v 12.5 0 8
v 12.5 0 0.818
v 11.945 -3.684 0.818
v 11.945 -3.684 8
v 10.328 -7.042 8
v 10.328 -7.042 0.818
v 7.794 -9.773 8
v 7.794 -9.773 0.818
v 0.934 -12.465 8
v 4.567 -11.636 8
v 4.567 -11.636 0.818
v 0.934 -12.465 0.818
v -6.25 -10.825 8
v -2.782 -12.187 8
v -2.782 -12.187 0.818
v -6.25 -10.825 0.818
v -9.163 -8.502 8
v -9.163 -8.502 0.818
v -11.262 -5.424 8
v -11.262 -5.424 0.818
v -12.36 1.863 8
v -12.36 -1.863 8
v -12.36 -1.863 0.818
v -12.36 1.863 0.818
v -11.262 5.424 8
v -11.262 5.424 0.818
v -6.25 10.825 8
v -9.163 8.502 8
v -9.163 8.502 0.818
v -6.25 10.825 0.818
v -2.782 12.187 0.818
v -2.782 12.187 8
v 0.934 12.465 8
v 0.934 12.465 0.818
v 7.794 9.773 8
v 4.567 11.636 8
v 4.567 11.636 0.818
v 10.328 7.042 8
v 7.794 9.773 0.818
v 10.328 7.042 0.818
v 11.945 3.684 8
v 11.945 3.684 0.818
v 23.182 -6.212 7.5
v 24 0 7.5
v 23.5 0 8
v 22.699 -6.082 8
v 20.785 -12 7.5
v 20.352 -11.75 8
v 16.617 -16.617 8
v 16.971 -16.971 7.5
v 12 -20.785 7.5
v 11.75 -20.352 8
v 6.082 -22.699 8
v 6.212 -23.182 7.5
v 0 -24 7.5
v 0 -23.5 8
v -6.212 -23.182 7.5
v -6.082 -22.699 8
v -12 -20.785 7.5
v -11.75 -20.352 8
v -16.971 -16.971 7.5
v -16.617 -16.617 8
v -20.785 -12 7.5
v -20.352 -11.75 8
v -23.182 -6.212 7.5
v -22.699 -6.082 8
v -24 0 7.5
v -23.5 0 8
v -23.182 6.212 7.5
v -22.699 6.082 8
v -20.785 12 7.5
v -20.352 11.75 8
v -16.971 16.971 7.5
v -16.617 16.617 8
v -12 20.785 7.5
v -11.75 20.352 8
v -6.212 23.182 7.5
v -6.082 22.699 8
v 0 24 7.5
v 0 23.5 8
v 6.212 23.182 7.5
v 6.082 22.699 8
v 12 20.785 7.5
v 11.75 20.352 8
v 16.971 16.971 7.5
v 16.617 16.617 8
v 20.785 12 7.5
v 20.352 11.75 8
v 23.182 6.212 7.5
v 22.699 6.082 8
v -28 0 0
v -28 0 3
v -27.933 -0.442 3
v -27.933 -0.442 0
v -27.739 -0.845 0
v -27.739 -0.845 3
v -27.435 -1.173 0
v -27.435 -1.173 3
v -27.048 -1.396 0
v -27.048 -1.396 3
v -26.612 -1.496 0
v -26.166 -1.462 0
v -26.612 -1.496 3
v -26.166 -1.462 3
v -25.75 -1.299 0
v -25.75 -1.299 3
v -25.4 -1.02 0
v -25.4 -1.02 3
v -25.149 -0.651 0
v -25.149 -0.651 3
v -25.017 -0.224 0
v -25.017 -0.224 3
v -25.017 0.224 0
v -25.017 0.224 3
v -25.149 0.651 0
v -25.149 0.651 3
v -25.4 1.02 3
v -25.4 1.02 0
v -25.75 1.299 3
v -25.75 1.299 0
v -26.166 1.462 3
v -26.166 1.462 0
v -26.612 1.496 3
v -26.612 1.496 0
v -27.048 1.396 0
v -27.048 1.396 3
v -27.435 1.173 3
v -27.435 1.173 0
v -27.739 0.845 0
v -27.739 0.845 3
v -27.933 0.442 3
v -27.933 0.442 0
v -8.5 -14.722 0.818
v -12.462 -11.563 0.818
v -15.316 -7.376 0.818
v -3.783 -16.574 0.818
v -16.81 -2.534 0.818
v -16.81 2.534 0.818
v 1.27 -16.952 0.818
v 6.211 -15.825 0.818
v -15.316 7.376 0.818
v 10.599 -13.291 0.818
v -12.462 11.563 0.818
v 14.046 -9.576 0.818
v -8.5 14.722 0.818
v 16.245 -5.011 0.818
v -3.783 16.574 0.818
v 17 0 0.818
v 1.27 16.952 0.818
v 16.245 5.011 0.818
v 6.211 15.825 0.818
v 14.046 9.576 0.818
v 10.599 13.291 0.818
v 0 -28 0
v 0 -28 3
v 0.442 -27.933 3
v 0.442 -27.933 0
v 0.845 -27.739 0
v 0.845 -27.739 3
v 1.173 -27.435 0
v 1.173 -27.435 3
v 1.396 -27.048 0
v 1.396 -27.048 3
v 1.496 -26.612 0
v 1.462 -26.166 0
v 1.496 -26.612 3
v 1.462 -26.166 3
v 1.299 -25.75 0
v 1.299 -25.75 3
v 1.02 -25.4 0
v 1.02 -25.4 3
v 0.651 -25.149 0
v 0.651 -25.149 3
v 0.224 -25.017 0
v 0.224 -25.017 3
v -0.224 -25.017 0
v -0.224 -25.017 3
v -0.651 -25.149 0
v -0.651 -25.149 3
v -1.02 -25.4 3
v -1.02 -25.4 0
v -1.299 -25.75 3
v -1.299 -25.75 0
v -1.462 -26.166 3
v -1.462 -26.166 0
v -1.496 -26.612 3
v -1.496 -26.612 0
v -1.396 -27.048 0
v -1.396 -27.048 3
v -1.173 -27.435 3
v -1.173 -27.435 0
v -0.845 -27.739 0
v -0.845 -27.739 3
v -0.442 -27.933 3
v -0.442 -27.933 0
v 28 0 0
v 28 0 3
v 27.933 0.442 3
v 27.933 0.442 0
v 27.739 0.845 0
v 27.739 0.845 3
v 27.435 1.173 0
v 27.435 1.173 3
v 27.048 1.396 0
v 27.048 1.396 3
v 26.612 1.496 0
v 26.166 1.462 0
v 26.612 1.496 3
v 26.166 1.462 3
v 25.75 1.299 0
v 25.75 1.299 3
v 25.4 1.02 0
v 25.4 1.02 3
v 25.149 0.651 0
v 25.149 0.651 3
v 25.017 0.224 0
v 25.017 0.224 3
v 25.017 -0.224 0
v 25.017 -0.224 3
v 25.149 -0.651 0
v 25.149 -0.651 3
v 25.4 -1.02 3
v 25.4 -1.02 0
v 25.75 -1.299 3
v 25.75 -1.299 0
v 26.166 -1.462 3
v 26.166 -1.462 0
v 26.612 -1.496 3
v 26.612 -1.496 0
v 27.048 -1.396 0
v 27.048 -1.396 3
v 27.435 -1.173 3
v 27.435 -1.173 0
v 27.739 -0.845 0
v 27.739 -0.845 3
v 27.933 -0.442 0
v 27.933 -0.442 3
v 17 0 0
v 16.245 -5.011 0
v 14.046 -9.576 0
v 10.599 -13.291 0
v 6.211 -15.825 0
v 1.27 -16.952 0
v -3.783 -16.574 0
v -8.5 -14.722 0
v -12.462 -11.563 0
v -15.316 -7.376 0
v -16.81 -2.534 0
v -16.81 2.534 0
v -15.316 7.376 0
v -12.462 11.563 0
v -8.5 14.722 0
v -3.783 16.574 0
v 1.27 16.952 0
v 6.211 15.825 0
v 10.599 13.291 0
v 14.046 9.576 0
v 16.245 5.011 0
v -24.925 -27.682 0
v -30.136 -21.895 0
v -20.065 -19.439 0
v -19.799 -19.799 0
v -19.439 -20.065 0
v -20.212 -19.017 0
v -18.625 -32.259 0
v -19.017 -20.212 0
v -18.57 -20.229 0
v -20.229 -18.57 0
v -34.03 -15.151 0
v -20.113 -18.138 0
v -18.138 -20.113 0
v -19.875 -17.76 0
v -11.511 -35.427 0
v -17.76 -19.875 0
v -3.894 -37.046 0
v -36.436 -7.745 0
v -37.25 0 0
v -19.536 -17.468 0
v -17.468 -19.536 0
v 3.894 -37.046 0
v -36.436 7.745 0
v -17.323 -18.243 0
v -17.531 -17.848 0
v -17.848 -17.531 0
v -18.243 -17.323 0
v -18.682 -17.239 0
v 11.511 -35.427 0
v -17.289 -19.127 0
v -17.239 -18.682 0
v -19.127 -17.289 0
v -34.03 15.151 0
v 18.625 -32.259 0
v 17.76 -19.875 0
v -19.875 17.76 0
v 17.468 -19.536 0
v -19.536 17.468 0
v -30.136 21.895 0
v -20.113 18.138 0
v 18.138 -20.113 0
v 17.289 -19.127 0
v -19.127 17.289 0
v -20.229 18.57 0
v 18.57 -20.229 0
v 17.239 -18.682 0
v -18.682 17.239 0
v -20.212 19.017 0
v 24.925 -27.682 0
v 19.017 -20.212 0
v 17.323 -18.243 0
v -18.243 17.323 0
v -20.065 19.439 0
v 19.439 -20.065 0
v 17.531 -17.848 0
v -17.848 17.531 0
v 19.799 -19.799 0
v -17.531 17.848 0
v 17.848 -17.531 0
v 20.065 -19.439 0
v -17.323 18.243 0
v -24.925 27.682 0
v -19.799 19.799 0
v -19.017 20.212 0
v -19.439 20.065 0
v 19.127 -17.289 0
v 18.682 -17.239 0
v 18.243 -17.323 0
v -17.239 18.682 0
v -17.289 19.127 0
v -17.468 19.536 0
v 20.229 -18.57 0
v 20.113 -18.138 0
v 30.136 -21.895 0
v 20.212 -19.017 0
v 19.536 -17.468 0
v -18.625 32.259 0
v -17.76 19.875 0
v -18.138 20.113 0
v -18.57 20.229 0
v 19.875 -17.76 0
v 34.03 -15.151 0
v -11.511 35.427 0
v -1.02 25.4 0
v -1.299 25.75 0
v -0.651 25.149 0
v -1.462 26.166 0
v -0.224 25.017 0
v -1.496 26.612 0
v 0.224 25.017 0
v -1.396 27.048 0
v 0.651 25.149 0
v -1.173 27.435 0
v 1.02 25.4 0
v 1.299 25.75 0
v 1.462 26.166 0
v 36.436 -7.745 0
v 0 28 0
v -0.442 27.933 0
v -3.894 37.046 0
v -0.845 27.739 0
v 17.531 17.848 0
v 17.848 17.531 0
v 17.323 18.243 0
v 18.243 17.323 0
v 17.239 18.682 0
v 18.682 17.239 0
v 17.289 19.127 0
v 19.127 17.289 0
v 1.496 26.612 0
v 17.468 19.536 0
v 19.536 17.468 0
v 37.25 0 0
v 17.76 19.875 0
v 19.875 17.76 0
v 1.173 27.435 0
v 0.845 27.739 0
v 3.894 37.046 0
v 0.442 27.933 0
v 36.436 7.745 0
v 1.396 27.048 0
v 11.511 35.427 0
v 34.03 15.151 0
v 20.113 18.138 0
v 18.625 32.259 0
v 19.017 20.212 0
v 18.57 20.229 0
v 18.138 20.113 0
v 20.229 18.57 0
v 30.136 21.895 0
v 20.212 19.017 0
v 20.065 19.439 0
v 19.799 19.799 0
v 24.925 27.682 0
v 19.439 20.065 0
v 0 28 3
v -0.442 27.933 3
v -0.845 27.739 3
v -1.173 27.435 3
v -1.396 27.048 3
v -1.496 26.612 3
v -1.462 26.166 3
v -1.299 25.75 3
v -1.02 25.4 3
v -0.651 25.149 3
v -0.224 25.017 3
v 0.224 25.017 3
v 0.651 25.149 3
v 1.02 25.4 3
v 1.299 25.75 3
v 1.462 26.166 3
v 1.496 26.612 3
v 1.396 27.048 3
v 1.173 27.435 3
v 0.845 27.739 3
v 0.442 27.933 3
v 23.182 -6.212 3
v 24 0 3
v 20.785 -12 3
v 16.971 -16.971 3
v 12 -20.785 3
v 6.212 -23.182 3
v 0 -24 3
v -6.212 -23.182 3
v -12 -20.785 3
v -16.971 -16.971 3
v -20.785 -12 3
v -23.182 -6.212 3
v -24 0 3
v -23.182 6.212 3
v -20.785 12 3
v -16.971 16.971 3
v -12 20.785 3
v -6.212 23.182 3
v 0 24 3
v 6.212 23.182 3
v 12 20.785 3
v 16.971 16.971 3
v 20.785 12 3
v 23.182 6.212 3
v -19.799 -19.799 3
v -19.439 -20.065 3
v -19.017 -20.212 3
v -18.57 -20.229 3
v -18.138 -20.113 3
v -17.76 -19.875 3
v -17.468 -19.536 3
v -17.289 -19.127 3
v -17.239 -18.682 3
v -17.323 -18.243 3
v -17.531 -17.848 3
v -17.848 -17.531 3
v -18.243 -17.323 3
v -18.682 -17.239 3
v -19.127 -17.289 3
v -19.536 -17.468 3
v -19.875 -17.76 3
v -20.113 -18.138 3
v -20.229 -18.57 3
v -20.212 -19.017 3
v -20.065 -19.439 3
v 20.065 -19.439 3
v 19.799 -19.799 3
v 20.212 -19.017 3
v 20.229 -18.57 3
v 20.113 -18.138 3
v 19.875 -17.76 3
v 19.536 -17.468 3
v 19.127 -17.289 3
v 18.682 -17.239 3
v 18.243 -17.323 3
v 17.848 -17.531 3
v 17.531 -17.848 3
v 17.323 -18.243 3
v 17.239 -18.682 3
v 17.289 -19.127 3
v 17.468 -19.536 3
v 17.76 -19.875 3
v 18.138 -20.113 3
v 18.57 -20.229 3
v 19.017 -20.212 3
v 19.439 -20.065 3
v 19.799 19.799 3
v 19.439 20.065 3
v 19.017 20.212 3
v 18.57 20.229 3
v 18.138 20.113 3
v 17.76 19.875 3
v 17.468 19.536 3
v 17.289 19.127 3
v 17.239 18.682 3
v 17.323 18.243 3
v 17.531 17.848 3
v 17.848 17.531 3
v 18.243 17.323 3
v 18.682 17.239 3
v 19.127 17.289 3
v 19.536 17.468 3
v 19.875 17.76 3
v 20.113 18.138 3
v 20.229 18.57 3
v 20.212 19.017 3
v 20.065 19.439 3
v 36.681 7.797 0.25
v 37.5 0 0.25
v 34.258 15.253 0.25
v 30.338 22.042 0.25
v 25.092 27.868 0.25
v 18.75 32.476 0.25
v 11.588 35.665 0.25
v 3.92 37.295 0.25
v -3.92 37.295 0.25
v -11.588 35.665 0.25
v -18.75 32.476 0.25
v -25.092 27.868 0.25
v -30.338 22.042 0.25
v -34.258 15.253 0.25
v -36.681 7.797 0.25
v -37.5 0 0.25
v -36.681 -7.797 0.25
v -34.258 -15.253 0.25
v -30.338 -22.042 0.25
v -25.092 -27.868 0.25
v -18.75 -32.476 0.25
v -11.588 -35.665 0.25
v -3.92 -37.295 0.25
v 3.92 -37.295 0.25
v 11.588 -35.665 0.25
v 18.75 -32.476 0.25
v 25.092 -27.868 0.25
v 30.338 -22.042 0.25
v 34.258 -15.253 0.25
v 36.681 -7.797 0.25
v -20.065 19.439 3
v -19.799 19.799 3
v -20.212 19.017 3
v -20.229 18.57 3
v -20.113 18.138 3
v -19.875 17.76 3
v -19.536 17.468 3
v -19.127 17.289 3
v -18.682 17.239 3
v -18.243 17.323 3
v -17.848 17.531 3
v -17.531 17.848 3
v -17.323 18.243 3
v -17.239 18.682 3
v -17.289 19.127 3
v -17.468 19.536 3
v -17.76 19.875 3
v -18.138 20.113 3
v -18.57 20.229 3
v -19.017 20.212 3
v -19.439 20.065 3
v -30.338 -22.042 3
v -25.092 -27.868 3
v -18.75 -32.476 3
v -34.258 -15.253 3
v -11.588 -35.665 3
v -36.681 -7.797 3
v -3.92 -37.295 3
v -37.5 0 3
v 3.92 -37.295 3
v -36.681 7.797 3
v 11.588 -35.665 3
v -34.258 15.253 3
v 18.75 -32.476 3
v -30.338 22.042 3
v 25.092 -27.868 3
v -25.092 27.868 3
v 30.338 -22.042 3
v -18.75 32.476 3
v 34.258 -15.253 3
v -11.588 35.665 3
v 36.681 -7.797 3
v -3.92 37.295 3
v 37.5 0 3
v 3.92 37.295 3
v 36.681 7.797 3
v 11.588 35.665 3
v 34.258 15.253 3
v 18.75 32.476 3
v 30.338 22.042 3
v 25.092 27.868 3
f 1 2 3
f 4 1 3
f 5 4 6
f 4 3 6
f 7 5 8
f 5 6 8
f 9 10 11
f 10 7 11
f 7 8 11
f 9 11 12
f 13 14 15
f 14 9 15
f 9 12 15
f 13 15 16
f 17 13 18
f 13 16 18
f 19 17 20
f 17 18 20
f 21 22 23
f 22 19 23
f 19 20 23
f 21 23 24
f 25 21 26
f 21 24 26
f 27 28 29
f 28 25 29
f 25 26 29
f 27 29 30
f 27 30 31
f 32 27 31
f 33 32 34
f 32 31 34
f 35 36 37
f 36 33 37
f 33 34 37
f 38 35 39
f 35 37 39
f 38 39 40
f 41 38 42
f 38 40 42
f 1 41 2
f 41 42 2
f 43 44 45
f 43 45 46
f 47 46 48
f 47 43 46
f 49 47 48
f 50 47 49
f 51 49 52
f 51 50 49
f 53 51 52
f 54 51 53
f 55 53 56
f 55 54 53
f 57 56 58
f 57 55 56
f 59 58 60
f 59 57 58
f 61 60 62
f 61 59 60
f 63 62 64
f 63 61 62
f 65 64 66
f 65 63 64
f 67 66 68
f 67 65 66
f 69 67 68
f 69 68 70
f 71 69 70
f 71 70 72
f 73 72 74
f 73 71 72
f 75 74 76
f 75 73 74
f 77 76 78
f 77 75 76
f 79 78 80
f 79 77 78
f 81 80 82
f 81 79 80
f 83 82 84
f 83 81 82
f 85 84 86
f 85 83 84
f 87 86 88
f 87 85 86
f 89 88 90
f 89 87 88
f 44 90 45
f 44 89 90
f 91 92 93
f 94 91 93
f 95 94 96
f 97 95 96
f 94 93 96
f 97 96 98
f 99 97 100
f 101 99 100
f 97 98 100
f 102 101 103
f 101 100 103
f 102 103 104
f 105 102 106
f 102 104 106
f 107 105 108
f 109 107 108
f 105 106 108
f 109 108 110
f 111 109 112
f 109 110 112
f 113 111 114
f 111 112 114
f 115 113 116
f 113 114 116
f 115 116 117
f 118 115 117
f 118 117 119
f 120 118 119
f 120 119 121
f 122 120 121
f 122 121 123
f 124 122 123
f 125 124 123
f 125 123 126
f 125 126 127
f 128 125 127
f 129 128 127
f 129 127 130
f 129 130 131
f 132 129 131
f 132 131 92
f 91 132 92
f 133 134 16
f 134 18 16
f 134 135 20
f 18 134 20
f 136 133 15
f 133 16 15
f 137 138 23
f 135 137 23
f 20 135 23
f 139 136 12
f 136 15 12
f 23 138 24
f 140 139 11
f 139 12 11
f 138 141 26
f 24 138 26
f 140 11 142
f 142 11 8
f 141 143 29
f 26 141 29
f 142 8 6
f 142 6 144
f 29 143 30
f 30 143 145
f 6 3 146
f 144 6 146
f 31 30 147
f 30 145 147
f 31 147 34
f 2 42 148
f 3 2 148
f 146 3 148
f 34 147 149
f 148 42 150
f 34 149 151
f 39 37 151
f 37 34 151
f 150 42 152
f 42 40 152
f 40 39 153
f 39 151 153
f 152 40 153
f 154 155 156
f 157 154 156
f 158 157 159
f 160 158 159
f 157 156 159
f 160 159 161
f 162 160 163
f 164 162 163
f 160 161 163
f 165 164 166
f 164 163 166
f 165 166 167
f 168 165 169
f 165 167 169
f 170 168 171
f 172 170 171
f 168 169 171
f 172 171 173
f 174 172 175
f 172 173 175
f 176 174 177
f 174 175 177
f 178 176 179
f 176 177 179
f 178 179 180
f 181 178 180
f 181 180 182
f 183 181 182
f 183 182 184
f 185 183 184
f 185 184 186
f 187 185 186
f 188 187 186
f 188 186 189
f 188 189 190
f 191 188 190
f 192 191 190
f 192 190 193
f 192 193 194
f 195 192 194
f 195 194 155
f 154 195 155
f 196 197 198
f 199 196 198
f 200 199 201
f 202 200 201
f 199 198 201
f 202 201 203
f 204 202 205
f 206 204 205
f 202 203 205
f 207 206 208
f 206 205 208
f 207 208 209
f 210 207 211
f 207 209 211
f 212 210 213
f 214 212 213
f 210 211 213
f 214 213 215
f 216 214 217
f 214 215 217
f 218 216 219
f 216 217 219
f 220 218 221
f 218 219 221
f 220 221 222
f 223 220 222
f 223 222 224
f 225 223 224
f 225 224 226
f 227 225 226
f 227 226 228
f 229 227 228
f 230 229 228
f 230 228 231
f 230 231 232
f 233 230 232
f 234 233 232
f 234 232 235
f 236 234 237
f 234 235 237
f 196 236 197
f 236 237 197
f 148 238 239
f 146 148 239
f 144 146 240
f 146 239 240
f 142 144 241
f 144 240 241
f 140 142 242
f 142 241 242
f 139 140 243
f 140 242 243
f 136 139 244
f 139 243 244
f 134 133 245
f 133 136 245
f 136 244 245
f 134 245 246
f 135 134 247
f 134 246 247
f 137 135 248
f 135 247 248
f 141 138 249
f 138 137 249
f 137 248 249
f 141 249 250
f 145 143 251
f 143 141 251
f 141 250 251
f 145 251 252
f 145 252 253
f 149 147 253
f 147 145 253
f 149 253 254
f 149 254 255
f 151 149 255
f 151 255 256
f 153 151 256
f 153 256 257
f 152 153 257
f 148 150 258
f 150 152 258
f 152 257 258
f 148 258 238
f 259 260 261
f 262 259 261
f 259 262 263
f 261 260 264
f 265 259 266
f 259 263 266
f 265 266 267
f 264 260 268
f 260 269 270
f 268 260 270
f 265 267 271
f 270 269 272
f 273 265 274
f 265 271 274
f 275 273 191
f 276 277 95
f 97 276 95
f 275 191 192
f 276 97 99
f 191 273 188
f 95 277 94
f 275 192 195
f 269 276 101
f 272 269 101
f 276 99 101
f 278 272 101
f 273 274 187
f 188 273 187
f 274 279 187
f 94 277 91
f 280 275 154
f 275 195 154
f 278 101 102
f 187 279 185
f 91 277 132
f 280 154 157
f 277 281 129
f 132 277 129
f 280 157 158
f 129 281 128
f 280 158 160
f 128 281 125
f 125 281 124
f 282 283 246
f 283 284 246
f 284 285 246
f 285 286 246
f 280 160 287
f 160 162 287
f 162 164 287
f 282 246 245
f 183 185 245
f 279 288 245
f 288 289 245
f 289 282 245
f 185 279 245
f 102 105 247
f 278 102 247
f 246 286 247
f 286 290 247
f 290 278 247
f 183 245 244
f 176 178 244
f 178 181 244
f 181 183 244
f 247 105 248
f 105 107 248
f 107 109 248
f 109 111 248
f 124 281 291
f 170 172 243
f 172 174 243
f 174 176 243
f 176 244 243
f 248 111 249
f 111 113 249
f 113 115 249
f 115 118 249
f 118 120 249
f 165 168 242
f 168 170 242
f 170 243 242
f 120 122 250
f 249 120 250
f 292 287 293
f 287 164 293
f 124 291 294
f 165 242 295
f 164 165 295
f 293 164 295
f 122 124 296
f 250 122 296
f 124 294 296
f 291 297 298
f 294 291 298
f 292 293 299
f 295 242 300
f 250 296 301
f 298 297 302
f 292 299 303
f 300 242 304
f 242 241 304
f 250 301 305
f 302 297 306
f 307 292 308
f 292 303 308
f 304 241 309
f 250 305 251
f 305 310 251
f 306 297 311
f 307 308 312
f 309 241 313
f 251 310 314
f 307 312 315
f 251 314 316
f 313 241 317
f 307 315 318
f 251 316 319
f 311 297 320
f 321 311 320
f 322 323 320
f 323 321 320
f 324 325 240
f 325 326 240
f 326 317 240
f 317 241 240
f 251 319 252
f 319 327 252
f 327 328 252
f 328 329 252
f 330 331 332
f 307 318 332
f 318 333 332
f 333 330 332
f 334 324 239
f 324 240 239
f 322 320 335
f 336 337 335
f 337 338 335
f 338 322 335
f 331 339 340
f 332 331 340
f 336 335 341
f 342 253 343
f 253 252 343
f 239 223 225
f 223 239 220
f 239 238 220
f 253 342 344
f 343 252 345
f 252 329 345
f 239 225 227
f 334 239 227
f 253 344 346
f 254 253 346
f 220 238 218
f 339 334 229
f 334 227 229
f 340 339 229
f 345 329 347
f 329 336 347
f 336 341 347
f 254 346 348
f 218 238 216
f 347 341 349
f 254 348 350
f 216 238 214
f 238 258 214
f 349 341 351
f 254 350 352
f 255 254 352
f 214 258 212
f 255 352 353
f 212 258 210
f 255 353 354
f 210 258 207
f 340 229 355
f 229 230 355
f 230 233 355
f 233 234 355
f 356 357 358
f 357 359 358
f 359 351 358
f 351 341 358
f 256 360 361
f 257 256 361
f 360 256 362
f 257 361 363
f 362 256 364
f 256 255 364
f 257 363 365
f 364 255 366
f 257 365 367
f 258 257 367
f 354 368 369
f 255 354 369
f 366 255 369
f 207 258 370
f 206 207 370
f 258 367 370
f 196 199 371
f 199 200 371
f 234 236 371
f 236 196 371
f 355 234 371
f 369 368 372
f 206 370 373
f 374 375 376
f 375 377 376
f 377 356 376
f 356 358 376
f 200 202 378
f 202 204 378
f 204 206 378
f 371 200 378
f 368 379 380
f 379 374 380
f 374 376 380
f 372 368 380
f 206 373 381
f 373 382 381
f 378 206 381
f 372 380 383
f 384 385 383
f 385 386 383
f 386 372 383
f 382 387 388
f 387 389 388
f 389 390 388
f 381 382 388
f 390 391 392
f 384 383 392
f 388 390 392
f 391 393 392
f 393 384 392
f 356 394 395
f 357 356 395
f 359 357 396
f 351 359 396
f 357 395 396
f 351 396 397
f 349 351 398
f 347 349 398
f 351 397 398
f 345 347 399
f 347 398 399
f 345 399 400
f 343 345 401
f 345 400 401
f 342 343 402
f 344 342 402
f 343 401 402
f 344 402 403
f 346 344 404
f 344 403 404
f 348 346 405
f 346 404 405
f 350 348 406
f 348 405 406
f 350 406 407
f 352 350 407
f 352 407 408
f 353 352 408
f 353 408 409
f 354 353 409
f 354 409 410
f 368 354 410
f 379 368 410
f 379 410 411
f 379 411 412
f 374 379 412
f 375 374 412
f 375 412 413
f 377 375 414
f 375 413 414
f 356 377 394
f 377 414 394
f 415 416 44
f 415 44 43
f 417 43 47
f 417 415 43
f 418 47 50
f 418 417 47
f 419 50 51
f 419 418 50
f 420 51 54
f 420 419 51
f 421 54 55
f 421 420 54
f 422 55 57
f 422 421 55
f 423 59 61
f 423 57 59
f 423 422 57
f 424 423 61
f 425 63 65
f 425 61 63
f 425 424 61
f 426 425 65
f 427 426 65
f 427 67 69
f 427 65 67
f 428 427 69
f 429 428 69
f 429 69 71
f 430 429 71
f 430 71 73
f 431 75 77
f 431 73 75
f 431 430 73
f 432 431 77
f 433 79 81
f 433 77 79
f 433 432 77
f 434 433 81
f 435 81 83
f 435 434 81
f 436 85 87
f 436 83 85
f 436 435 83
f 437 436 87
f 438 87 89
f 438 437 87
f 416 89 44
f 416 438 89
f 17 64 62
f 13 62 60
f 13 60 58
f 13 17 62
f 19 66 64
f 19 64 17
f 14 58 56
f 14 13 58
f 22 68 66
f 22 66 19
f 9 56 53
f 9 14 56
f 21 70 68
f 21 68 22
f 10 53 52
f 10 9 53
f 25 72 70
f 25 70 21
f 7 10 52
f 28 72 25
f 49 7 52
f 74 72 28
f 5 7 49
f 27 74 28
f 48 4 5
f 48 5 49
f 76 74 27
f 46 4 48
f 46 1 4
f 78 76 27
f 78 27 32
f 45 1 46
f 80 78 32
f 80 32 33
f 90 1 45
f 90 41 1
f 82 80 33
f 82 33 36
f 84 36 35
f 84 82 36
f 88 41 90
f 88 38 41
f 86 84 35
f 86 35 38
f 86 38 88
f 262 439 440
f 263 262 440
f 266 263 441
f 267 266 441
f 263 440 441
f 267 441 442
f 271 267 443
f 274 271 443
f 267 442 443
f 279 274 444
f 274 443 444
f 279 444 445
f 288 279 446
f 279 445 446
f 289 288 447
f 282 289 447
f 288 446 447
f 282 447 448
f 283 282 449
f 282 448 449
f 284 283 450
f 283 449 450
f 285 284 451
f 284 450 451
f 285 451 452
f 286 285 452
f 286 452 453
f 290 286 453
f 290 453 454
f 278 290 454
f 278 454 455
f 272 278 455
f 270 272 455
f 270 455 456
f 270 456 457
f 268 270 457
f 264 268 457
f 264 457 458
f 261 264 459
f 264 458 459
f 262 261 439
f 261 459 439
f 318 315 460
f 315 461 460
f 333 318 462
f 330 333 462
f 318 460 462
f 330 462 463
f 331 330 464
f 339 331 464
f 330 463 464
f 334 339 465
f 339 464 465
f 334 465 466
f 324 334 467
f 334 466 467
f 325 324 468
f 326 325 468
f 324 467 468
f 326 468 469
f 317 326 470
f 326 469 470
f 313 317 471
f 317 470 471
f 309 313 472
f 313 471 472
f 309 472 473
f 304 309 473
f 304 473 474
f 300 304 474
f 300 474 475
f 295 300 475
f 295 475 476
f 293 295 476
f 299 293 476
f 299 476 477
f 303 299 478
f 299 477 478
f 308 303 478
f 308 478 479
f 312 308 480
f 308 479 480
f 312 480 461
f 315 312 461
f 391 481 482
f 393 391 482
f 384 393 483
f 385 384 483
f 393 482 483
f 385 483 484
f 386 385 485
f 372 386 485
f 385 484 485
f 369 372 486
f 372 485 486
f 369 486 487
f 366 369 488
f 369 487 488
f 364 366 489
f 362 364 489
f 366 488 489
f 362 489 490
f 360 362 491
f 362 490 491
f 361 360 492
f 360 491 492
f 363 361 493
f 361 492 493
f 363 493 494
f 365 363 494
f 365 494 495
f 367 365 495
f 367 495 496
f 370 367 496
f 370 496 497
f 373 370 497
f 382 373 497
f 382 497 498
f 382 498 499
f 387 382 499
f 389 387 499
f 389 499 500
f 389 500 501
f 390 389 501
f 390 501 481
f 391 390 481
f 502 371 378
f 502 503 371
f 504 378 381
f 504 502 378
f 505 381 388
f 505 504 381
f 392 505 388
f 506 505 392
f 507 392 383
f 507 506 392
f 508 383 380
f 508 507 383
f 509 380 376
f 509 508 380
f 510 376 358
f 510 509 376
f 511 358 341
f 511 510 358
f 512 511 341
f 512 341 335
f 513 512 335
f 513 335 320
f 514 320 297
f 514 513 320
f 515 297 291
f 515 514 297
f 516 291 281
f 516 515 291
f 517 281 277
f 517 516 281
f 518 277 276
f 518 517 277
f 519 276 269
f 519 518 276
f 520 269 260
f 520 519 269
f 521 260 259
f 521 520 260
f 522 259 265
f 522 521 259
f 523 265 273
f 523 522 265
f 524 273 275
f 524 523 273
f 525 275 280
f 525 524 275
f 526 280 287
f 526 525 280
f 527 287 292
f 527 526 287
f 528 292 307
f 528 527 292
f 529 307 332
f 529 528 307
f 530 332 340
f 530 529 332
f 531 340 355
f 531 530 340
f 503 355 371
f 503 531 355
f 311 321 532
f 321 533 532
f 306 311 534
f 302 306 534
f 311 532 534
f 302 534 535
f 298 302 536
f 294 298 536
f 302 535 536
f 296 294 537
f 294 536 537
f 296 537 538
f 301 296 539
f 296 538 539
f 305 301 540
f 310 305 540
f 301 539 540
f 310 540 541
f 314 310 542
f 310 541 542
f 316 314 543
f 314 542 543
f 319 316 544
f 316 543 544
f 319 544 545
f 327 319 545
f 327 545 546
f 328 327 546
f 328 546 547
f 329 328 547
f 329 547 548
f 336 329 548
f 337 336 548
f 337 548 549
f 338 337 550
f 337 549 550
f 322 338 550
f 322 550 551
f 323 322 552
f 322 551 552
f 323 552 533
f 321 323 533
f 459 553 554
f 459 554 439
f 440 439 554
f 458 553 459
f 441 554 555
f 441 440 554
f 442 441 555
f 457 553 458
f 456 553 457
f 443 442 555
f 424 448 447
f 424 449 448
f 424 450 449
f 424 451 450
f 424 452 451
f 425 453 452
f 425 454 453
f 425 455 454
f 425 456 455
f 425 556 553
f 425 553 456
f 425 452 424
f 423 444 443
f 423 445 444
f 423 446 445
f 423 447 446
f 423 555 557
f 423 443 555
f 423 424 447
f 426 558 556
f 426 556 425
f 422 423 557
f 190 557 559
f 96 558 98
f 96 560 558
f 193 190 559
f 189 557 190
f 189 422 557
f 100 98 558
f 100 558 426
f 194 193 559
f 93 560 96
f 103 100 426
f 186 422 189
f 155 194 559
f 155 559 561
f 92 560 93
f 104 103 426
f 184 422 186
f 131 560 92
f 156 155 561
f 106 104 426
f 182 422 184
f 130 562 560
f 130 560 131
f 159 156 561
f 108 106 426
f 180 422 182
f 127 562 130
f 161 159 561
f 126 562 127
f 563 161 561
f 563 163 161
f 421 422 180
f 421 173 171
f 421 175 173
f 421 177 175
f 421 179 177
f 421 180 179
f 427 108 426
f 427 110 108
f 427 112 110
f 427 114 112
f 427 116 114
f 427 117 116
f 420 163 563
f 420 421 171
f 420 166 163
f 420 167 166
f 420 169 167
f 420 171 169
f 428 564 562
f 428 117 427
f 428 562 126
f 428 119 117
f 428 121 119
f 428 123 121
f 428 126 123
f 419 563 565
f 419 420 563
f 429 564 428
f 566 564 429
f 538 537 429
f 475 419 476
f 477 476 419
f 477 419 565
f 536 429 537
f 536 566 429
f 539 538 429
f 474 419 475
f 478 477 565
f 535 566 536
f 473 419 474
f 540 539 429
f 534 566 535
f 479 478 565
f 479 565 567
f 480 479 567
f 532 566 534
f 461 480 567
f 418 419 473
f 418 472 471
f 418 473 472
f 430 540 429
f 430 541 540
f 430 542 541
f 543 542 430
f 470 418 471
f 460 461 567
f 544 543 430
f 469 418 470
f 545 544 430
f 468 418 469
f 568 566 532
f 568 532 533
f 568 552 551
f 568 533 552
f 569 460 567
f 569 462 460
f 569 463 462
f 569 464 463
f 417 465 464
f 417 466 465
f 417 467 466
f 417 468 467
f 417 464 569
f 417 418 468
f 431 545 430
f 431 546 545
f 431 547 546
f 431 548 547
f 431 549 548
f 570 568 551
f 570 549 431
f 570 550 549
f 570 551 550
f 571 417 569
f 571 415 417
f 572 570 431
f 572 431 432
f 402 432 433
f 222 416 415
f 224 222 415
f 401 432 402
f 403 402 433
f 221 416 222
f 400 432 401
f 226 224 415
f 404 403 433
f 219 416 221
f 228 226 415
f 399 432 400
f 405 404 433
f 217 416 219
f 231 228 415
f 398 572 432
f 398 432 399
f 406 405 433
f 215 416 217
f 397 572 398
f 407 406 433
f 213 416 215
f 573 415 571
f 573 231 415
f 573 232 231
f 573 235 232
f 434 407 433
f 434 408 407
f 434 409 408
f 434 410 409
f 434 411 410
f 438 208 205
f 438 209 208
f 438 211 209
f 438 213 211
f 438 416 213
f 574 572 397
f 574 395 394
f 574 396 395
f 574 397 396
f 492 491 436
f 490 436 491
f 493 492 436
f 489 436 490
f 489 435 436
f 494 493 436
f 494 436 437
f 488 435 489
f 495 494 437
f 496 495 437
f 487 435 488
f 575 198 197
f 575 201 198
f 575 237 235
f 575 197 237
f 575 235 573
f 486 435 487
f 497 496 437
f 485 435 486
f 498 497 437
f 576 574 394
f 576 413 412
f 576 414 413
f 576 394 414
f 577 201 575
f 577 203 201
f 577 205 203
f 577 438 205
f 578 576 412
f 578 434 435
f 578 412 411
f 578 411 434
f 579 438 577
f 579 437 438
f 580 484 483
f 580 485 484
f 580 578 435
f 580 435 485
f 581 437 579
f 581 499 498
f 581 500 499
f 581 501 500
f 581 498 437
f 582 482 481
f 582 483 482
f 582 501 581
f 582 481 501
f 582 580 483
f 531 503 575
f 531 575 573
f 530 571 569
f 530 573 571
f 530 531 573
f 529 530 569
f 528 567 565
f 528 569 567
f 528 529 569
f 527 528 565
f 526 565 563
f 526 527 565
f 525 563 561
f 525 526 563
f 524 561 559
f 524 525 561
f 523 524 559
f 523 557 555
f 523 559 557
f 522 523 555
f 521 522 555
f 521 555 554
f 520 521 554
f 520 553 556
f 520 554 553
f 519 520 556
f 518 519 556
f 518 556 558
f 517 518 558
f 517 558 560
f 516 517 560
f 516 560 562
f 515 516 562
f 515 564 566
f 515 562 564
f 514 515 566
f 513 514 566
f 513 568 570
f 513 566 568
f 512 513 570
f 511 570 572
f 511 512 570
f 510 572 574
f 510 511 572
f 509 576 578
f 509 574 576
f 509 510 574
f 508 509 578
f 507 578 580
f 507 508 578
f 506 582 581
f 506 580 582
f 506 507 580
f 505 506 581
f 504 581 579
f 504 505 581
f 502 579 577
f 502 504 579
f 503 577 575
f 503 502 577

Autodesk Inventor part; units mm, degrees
ref_plane "YZ Plane" through (0, 0, 0) normal (1, 0, 0) x (0, 1, 0)
ref_plane "XZ Plane" through (0, 0, 0) normal (0, 1, 0) x (-1, 0, 0)
sketch "Sketch1" plane through (0, 0, 0) normal (0, 0, 1) x (1, 0, 0)
  circle A0 centre (0, 0) radius 37.5
  circle A1 centre (0, 0) radius 12.5
  circle A2 centre (0, 0) radius 26.5 construction
  line L0 (0, 0) -> (0, 26.5) construction
  line L1 (0, 0) -> (10.1411, 24.4828) construction
  circle A3 centre (0, 0) radius 24
  circle A4 centre (0, 0) radius 17
  dimension "d0" = 75
  dimension "d1" = 25
  dimension "d2" = 53
  dimension "d3" = 22.5
  dimension "d19" = 48
  dimension "d22" = 34
extrude "Extrusion1" add sketch "Sketch1" along normal blind 3 contours A0 | A3 | A4
extrude "Extrusion2" add sketch "Sketch1" along normal blind 8 contours A3 | A4
chamfer "Chamfer1" distance 0.25 angle 45 1 edges at (-37.5, 0, 0)
ref_plane "Work Plane1" through (-14, -14, 0.8184) normal (0, 0, 1) x (1, 0, 0)
extrude "Extrusion3" cut sketch "Sketch1" along normal up to surface (0.8184 mm away) contours A4
thread "Thread1" size "M48x1.5" class "6g" standard "ISO Metric profile" full length
chamfer "Chamfer2" distance 0.5 angle 45 1 edges at (-24, 0, 8)
hole "Hole2" at (0, 26.5, 0) direction (0, 0, 1) diameter 3 end through all
pattern_circular "Circular Pattern2" count 8 over 360 about axis through (0, 0, -10) along (0, 0, 1) of "Hole2"
properties part number "PWTR-0060" material "Aluminum 6061"
